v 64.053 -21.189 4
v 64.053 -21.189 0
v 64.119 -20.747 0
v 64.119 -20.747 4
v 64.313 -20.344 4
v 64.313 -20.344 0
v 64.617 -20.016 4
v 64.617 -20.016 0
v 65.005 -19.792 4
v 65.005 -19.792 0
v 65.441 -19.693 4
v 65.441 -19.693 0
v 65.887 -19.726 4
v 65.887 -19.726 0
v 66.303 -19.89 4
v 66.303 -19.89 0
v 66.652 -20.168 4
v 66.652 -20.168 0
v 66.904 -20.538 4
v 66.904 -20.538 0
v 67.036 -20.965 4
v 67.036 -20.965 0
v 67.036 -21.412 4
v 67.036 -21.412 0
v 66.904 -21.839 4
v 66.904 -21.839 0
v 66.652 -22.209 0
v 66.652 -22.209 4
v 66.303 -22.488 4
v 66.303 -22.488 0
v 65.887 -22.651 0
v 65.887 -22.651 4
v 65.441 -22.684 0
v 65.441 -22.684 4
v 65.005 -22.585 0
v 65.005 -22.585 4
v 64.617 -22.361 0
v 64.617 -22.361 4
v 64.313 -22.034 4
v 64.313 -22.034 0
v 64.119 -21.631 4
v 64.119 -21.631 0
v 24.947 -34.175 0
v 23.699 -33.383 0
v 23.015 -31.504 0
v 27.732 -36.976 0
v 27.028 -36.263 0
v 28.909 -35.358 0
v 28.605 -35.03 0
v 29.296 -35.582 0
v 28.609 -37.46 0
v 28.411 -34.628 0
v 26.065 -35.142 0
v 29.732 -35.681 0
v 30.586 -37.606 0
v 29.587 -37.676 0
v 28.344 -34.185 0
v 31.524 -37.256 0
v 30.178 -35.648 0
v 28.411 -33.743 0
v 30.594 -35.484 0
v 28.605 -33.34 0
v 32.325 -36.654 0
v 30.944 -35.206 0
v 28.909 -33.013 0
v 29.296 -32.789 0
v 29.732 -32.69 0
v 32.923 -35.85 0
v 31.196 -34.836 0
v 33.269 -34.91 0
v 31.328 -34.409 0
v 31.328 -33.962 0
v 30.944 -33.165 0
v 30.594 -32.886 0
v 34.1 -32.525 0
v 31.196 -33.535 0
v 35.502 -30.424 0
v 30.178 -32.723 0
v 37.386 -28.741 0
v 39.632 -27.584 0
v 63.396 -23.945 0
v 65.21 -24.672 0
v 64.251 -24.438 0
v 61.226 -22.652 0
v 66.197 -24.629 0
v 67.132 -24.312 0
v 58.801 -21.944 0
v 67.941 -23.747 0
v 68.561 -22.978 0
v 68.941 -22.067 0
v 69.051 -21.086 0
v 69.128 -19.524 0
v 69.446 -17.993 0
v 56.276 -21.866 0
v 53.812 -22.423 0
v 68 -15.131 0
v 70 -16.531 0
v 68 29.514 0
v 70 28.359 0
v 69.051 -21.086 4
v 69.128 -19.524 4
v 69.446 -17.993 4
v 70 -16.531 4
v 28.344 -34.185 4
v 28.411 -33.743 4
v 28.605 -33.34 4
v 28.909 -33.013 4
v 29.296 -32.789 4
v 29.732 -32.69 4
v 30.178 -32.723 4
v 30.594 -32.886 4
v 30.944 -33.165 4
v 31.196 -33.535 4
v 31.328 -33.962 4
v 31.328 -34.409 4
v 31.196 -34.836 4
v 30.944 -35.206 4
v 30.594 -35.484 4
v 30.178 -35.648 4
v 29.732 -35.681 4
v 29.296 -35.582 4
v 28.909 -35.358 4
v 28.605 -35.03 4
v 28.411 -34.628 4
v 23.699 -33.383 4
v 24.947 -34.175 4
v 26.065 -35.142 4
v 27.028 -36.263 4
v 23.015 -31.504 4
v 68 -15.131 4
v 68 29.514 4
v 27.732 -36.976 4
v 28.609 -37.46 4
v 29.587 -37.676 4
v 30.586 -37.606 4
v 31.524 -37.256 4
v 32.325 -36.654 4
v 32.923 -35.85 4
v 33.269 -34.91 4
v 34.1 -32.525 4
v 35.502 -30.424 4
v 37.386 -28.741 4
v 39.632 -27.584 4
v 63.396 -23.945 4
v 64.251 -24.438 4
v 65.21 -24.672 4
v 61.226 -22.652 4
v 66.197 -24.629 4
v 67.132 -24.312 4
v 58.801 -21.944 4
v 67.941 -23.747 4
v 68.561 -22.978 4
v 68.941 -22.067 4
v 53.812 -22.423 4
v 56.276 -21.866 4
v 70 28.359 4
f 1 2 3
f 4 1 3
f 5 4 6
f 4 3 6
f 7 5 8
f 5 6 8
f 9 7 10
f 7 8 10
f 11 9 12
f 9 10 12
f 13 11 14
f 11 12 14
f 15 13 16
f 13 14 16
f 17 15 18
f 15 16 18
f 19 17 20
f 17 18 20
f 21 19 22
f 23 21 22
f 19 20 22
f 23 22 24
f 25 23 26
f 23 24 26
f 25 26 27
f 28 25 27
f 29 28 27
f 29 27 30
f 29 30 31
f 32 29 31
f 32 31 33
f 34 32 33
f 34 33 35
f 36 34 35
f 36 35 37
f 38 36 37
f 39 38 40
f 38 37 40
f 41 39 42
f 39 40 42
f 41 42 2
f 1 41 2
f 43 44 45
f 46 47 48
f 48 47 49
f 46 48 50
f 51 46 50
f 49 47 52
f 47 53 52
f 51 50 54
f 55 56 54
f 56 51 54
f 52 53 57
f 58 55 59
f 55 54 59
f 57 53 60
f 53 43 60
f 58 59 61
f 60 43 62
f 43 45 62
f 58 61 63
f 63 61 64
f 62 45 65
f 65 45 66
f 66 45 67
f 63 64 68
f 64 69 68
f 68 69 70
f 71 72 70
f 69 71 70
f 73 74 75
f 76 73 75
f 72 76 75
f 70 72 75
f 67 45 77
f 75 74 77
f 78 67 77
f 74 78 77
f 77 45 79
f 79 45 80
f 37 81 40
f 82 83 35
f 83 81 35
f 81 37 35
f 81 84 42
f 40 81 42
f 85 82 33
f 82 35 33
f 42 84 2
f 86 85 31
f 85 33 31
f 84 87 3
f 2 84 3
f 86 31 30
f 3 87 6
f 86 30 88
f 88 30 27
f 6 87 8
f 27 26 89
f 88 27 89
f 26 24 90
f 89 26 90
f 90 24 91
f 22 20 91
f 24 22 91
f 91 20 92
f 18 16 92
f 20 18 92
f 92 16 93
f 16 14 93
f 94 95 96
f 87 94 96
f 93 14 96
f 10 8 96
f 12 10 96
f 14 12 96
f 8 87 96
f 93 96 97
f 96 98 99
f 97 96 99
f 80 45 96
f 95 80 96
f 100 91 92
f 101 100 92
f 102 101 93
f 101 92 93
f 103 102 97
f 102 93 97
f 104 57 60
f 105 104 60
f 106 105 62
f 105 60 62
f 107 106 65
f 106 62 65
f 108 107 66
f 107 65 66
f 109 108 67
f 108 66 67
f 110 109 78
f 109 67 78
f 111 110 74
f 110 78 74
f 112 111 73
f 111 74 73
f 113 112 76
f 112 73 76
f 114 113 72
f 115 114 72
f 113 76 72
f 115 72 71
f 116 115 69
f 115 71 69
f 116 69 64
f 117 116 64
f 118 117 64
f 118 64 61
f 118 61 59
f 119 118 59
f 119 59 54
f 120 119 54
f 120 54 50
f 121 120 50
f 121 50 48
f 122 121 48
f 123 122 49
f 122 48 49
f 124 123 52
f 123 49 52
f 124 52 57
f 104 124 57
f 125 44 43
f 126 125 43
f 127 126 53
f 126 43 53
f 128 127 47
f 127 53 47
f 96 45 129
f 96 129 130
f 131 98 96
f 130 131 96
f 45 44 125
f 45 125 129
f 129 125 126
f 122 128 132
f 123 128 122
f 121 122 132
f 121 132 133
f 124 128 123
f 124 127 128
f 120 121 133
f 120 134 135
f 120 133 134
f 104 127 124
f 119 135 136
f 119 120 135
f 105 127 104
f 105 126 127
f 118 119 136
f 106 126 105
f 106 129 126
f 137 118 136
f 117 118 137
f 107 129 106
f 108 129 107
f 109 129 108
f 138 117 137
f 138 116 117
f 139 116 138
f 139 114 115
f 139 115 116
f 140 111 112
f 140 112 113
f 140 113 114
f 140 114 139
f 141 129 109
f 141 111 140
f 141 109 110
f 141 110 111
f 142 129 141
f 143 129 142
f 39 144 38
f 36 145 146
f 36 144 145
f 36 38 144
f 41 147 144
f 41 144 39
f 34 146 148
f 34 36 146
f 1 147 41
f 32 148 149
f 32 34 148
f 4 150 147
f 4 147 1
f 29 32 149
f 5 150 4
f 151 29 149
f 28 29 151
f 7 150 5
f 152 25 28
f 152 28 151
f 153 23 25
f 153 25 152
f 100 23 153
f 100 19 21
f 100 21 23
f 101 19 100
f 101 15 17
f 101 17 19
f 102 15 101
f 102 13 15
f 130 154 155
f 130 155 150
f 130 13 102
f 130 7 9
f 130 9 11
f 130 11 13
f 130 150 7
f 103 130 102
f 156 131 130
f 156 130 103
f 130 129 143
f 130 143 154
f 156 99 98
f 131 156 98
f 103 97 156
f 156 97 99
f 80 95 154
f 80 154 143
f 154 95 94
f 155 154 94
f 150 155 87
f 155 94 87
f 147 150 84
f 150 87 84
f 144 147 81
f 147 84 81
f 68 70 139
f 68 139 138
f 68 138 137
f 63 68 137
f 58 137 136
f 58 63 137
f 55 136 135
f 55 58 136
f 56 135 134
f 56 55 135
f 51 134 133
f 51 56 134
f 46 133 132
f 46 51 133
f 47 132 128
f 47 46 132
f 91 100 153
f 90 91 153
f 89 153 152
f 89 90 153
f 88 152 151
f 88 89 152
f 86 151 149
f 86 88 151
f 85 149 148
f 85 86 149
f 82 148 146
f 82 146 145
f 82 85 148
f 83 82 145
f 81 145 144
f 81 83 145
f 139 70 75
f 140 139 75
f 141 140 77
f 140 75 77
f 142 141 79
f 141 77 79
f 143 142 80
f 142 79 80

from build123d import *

# Parameters (mm, degrees)
BOSS_EXTRUDE1_DEPTH = 4
SKETCH3_R           = 1.5
BOSS_EXTRUDE3_DEPTH = 4
LPATTERN2_COUNT     = 2
LPATTERN2_PITCH     = 38
FILLET1_DEPTH       = 4


with BuildPart() as part:
    # Sketch1 → Boss-Extrude1 (new body)
    with BuildSketch(Plane.XY):
        Polygon((23.699409247, -33.383107264), (23.015368961, -31.503722023), (70, -14.402714856), (70, -16.531070401), align=None)
        Polygon((68, -15.130655325), (70, -14.402714856), (70, 28.358983849), (68, 29.513684387), align=None)
    extrude(amount=BOSS_EXTRUDE1_DEPTH)

    # Sketch3 → Boss-Extrude3 (add)
    # profile 1 of 3: a face of its own
    with BuildSketch(Plane(origin=(0, 0, 0), x_dir=(-1, 0, 0), z_dir=(0, 0, -1))):
        with BuildLine():
            ThreePointArc((-33.133334302, -32.988363728), (-31.041480631, -37.474358403), (-26.555485957, -35.382504732))
            ThreePointArc((-26.555485957, -35.382504732), (-26.397582994, -34.793202852), (-26.34441013, -34.18543423))
            ThreePointArc((-26.34441013, -34.18543423), (-26.503443688, -33.142389054), (-26.96609198, -32.194131985))
            Line((-26.96609198, -32.194131985), (-30.769345343, -30.809860967))
            ThreePointArc((-30.769345343, -30.809860967), (-32.216249353, -31.61164739), (-33.133334302, -32.988363728))
        make_face()
        with Locations((-29.84441013, -34.18543423)):
            Circle(SKETCH3_R, mode=Mode.SUBTRACT)
    # profile 2 of 3: a face of its own
    with BuildSketch(Plane(origin=(0, 0, 0), x_dir=(-1, 0, 0), z_dir=(0, 0, -1))):
        with BuildLine():
            ThreePointArc((-26.34441013, -34.18543423), (-26.397582994, -34.793202852), (-26.555485957, -35.382504732))
            Line((-26.555485957, -35.382504732), (-25.578794489, -32.699066978))
            Line((-25.578794489, -32.699066978), (-26.96609198, -32.194131985))
            ThreePointArc((-26.96609198, -32.194131985), (-26.503443688, -33.142389054), (-26.34441013, -34.18543423))
        make_face()
    # profile 3 of 3: a face of its own
    with BuildSketch(Plane(origin=(0, 0, 0), x_dir=(-1, 0, 0), z_dir=(0, 0, -1))):
        with BuildLine():
            Line((-32.156642834, -30.304925974), (-33.133334302, -32.988363728))
            ThreePointArc((-33.133334302, -32.988363728), (-32.216249353, -31.61164739), (-30.769345343, -30.809860967))
            Line((-30.769345343, -30.809860967), (-32.156642834, -30.304925974))
        make_face()
    boss_extrude3 = extrude(amount=-BOSS_EXTRUDE3_DEPTH)

    # LPattern2: Boss-Extrude3 ×2
    with Locations(*[Vector(0.9396926207859079, 0.3420201433256704, 0) * (i * LPATTERN2_PITCH) for i in range(1, LPATTERN2_COUNT)]):
        add(boss_extrude3)

    # Fillet1: read off the stored shape, not the designer's step
    # Fillet1 outline → Fillet1 (add)
    with BuildSketch(Plane.XY):
        with BuildLine():
            ThreePointArc((68.841653892, -19.991598282), (68.990249602, -20.53029423), (69.051216895, -21.085773301))
            ThreePointArc((69.051216895, -21.085773301), (69.257041708, -18.75247713), (70, -16.531070401))
            Line((70, -16.531070401), (67.864962424, -17.308160528))
            Line((67.864962424, -17.308160528), (68.841653892, -19.991598282))
        make_face()
        with BuildLine():
            Line((61.287114079, -19.702301531), (53.812215852, -22.42294199))
            ThreePointArc((53.812215852, -22.42294199), (58.800886589, -21.943638956), (63.395611681, -23.944905669))
            ThreePointArc((63.395611681, -23.944905669), (62.720311337, -23.244734469), (62.263805547, -22.385739285))
            Line((62.263805547, -22.385739285), (61.287114079, -19.702301531))
        make_face()
        with BuildLine():
            ThreePointArc((33.133334302, -32.988363728), (33.33578204, -33.939828481), (33.268533335, -34.910265432))
            ThreePointArc((33.268533335, -34.910265432), (35.501907513, -30.423773828), (39.631541062, -27.584285515))
            Line((39.631541062, -27.584285515), (32.156642834, -30.304925974))
            Line((32.156642834, -30.304925974), (33.133334302, -32.988363728))
        make_face()
        with BuildLine():
            ThreePointArc((23.699409247, -33.383107264), (25.524081147, -34.637762706), (27.027892588, -36.263228478))
            ThreePointArc((27.027892588, -36.263228478), (26.760091208, -35.839815319), (26.555485957, -35.382504732))
            Line((26.555485957, -35.382504732), (25.578794489, -32.699066978))
            Line((25.578794489, -32.699066978), (23.699409247, -33.383107264))
        make_face()
    extrude(amount=FILLET1_DEPTH)


solid = part.part
